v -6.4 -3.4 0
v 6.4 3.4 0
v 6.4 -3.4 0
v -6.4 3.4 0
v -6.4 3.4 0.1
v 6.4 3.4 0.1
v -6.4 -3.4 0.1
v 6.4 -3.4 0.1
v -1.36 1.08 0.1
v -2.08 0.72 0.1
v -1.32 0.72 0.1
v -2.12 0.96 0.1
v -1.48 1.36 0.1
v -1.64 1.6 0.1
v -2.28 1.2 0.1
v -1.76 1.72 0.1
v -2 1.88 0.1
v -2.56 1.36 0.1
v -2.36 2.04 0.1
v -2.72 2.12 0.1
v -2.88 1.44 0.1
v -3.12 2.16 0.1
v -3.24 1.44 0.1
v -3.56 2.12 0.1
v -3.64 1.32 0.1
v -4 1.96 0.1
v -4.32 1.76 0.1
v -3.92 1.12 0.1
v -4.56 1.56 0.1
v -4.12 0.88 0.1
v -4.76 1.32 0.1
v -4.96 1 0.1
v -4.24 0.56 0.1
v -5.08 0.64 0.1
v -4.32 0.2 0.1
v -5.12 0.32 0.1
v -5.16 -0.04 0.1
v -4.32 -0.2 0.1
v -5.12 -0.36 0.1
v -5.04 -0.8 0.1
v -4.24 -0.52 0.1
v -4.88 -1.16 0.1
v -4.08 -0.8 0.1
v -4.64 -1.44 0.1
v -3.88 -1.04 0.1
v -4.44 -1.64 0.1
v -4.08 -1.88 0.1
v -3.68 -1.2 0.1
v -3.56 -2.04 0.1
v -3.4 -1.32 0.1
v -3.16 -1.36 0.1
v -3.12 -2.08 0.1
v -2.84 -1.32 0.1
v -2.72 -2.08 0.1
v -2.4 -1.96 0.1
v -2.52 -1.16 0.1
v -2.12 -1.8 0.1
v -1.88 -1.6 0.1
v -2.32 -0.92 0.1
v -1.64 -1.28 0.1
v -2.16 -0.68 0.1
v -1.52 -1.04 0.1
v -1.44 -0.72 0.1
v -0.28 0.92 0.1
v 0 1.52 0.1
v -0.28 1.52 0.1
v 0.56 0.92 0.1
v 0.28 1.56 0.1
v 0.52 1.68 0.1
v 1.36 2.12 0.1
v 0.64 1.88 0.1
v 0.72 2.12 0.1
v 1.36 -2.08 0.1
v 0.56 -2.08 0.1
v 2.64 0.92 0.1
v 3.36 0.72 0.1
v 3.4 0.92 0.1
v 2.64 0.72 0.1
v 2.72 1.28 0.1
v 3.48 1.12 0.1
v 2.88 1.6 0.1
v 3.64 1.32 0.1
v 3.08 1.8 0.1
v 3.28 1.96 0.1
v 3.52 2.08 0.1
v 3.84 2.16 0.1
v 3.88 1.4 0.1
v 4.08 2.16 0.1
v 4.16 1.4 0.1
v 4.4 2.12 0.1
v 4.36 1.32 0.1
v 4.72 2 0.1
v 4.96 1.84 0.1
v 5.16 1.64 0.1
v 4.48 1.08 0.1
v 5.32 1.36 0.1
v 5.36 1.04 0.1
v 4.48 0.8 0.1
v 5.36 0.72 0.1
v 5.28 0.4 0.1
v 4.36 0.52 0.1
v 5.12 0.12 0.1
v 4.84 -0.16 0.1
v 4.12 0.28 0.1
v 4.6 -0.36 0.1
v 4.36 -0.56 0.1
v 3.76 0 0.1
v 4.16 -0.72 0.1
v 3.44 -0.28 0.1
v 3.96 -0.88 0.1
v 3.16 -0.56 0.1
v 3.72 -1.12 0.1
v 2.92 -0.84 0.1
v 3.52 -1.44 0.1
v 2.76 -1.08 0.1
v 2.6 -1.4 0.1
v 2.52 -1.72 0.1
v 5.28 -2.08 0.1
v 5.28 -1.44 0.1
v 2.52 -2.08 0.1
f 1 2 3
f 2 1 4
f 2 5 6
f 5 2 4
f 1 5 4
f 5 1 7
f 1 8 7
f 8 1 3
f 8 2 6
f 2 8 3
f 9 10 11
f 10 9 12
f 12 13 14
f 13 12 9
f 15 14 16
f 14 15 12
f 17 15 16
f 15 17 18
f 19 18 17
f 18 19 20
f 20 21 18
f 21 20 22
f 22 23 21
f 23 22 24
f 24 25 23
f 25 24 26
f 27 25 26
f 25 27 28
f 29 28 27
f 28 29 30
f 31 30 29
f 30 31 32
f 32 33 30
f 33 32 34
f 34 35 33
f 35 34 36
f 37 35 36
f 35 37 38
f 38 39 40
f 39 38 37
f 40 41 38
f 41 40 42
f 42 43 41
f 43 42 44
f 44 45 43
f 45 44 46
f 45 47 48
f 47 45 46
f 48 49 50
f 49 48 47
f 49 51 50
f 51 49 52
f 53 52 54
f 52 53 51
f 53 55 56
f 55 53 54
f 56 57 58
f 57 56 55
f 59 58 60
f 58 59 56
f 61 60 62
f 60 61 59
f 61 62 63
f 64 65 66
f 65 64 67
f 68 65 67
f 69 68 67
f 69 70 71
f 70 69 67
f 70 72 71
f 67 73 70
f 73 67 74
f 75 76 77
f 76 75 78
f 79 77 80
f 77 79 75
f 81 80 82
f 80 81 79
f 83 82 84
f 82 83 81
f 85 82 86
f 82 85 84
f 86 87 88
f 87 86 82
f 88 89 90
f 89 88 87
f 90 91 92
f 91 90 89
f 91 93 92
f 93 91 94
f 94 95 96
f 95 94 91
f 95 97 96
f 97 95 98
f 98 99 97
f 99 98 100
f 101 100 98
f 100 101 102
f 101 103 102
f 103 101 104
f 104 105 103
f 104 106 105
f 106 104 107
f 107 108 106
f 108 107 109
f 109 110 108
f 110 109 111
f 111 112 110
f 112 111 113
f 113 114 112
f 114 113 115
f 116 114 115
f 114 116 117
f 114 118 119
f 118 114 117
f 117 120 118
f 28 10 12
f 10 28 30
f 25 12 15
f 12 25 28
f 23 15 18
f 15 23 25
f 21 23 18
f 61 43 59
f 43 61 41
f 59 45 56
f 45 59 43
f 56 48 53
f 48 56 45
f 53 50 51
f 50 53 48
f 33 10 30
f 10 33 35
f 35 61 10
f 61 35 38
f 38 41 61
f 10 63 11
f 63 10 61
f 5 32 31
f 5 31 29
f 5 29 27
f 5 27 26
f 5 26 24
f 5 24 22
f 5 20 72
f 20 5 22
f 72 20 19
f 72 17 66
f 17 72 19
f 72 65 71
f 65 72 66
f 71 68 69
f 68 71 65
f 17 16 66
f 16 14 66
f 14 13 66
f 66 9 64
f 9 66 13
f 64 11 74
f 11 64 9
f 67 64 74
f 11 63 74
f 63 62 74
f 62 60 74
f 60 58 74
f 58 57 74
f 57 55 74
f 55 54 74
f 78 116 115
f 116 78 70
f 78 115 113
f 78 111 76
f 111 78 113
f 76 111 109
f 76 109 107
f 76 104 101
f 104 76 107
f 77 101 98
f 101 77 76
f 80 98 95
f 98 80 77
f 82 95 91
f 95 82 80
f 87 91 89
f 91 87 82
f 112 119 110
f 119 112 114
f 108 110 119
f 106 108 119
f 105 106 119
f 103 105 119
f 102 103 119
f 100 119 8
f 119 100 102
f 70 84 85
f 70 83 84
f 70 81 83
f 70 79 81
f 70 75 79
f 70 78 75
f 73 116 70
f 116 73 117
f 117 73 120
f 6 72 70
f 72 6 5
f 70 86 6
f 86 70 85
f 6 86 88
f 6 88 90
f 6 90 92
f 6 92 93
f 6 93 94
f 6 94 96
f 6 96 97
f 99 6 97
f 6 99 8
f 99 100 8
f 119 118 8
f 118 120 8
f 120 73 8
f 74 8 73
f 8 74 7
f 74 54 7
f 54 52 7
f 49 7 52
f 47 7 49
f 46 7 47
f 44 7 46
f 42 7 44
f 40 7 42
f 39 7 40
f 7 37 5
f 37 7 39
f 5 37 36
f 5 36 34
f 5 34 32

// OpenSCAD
// file: ../p/box5-12.scad
use <../lib.scad>
function ldraw_lib__box5_12() = [
// 0 Box with 5 Faces without Any Edges
// 0 Name: box5-12.dat
// 0 Author: Chris Dee [cwdee]
// 0 !LDRAW_ORG Primitive UPDATE 2009-02
// 0 !LICENSE Licensed under CC BY 2.0 and CC BY 4.0 : see CAreadme.txt
// 
// 0 BFC CERTIFY CCW
  [0,"BFC","CERTIFY"],
  [0,"BFC","CCW"],
// 
// 0 !HISTORY 2009-09-03 [PTadmin] Official Update 2009-02
// 
// 
// 4 16 1 1 1 1 1 -1 -1 1 -1 -1 1 1
  [4,16,1,1,1,1,1,-1,-1,1,-1,-1,1,1],
// 4 16 -1 0 1 1 0 1 1 1 1 -1 1 1
  [4,16,-1,0,1,1,0,1,1,1,1,-1,1,1],
// 4 16 -1 0 -1 -1 0 1 -1 1 1 -1 1 -1
  [4,16,-1,0,-1,-1,0,1,-1,1,1,-1,1,-1],
// 4 16 1 0 -1 -1 0 -1 -1 1 -1 1 1 -1
  [4,16,1,0,-1,-1,0,-1,-1,1,-1,1,1,-1],
// 4 16 1 0 1 1 0 -1 1 1 -1 1 1 1
  [4,16,1,0,1,1,0,-1,1,1,-1,1,1,1],
// 0
];
makepoly(ldraw_lib__box5_12(), line=0.2);
// main file
use <../lib.scad>
use <../p/box5-12.scad>
function ldraw_lib__820674c() = [
// 0 Sticker  0.9 x  1.6 with White "C12"
// 0 Name: 820674c.dat
// 0 Author: Alexandre Bourdais [x-or]
// 0 !LDRAW_ORG Part UPDATE 2014-02
// 0 !LICENSE Licensed under CC BY 2.0 and CC BY 4.0 : see CAreadme.txt
// 
// 0 BFC CERTIFY CCW
  [0,"BFC","CERTIFY"],
  [0,"BFC","CCW"],
// 
// 0 !KEYWORDS coastal, cutter, Set 6353
// 
// 0 !HISTORY 2014-12-23 [PTadmin] Official Update 2014-02
// 
// 
// 1 16 0 -0.25 0 16 0 0 0 0.25 0 0 0 8.5 box5-12.dat
  [1,16,0,-0.25,0,16,0,0,0,0.25,0,0,0,8.5, ldraw_lib__box5_12()],
// 4 15 -5.2 -0.25 1.8 -3.3 -0.25 1.8 -3.4 -0.25 2.7 -5.3 -0.25 2.4
  [4,15,-5.2,-0.25,1.8,-3.3,-0.25,1.8,-3.4,-0.25,2.7,-5.3,-0.25,2.4],
// 4 15 -5.3 -0.25 2.4 -3.4 -0.25 2.7 -3.7 -0.25 3.4 -4.1 -0.25 4
  [4,15,-5.3,-0.25,2.4,-3.4,-0.25,2.7,-3.7,-0.25,3.4,-4.1,-0.25,4],
// 4 15 -5.7 -0.25 3 -5.3 -0.25 2.4 -4.1 -0.25 4 -4.4 -0.25 4.3
  [4,15,-5.7,-0.25,3,-5.3,-0.25,2.4,-4.1,-0.25,4,-4.4,-0.25,4.3],
// 4 15 -5.7 -0.25 3 -4.4 -0.25 4.3 -5 -0.25 4.7 -6.4 -0.25 3.4
  [4,15,-5.7,-0.25,3,-4.4,-0.25,4.3,-5,-0.25,4.7,-6.4,-0.25,3.4],
// 4 15 -6.4 -0.25 3.4 -5 -0.25 4.7 -5.9 -0.25 5.1 -6.8 -0.25 5.3
  [4,15,-6.4,-0.25,3.4,-5,-0.25,4.7,-5.9,-0.25,5.1,-6.8,-0.25,5.3],
// 4 15 -7.2 -0.25 3.6 -6.4 -0.25 3.4 -6.8 -0.25 5.3 -7.8 -0.25 5.4
  [4,15,-7.2,-0.25,3.6,-6.4,-0.25,3.4,-6.8,-0.25,5.3,-7.8,-0.25,5.4],
// 4 15 -8.1 -0.25 3.6 -7.2 -0.25 3.6 -7.8 -0.25 5.4 -8.9 -0.25 5.3
  [4,15,-8.1,-0.25,3.6,-7.2,-0.25,3.6,-7.8,-0.25,5.4,-8.9,-0.25,5.3],
// 4 15 -9.1 -0.25 3.3 -8.1 -0.25 3.6 -8.9 -0.25 5.3 -10 -0.25 4.9
  [4,15,-9.1,-0.25,3.3,-8.1,-0.25,3.6,-8.9,-0.25,5.3,-10,-0.25,4.9],
// 4 15 -9.8 -0.25 2.8 -9.1 -0.25 3.3 -10 -0.25 4.9 -10.8 -0.25 4.4
  [4,15,-9.8,-0.25,2.8,-9.1,-0.25,3.3,-10,-0.25,4.9,-10.8,-0.25,4.4],
// 4 15 -9.8 -0.25 2.8 -10.8 -0.25 4.4 -11.4 -0.25 3.9 -10.3 -0.25 2.2
  [4,15,-9.8,-0.25,2.8,-10.8,-0.25,4.4,-11.4,-0.25,3.9,-10.3,-0.25,2.2],
// 4 15 -10.3 -0.25 2.2 -11.4 -0.25 3.9 -11.9 -0.25 3.3 -12.4 -0.25 2.5
  [4,15,-10.3,-0.25,2.2,-11.4,-0.25,3.9,-11.9,-0.25,3.3,-12.4,-0.25,2.5],
// 4 15 -10.6 -0.25 1.4 -10.3 -0.25 2.2 -12.4 -0.25 2.5 -12.7 -0.25 1.6
  [4,15,-10.6,-0.25,1.4,-10.3,-0.25,2.2,-12.4,-0.25,2.5,-12.7,-0.25,1.6],
// 4 15 -10.8 -0.25 0.5 -10.6 -0.25 1.4 -12.7 -0.25 1.6 -12.8 -0.25 0.8
  [4,15,-10.8,-0.25,0.5,-10.6,-0.25,1.4,-12.7,-0.25,1.6,-12.8,-0.25,0.8],
// 4 15 -10.8 -0.25 0.5 -12.8 -0.25 0.8 -12.9 -0.25 -0.1 -10.8 -0.25 -0.5
  [4,15,-10.8,-0.25,0.5,-12.8,-0.25,0.8,-12.9,-0.25,-0.1,-10.8,-0.25,-0.5],
// 4 15 -10.8 -0.25 -0.5 -12.9 -0.25 -0.1 -12.8 -0.25 -0.9 -12.6 -0.25 -2
  [4,15,-10.8,-0.25,-0.5,-12.9,-0.25,-0.1,-12.8,-0.25,-0.9,-12.6,-0.25,-2],
// 4 15 -10.6 -0.25 -1.3 -10.8 -0.25 -0.5 -12.6 -0.25 -2 -12.2 -0.25 -2.9
  [4,15,-10.6,-0.25,-1.3,-10.8,-0.25,-0.5,-12.6,-0.25,-2,-12.2,-0.25,-2.9],
// 4 15 -10.2 -0.25 -2 -10.6 -0.25 -1.3 -12.2 -0.25 -2.9 -11.6 -0.25 -3.6
  [4,15,-10.2,-0.25,-2,-10.6,-0.25,-1.3,-12.2,-0.25,-2.9,-11.6,-0.25,-3.6],
// 4 15 -9.7 -0.25 -2.6 -10.2 -0.25 -2 -11.6 -0.25 -3.6 -11.1 -0.25 -4.1
  [4,15,-9.7,-0.25,-2.6,-10.2,-0.25,-2,-11.6,-0.25,-3.6,-11.1,-0.25,-4.1],
// 4 15 -9.7 -0.25 -2.6 -11.1 -0.25 -4.1 -10.2 -0.25 -4.7 -9.2 -0.25 -3
  [4,15,-9.7,-0.25,-2.6,-11.1,-0.25,-4.1,-10.2,-0.25,-4.7,-9.2,-0.25,-3],
// 4 15 -9.2 -0.25 -3 -10.2 -0.25 -4.7 -8.9 -0.25 -5.1 -8.5 -0.25 -3.3
  [4,15,-9.2,-0.25,-3,-10.2,-0.25,-4.7,-8.9,-0.25,-5.1,-8.5,-0.25,-3.3],
// 4 15 -8.5 -0.25 -3.3 -8.9 -0.25 -5.1 -7.8 -0.25 -5.2 -7.9 -0.25 -3.4
  [4,15,-8.5,-0.25,-3.3,-8.9,-0.25,-5.1,-7.8,-0.25,-5.2,-7.9,-0.25,-3.4],
// 4 15 -7.9 -0.25 -3.4 -7.8 -0.25 -5.2 -6.8 -0.25 -5.2 -7.1 -0.25 -3.3
  [4,15,-7.9,-0.25,-3.4,-7.8,-0.25,-5.2,-6.8,-0.25,-5.2,-7.1,-0.25,-3.3],
// 4 15 -7.1 -0.25 -3.3 -6.8 -0.25 -5.2 -6 -0.25 -4.9 -6.3 -0.25 -2.9
  [4,15,-7.1,-0.25,-3.3,-6.8,-0.25,-5.2,-6,-0.25,-4.9,-6.3,-0.25,-2.9],
// 4 15 -6.3 -0.25 -2.9 -6 -0.25 -4.9 -5.3 -0.25 -4.5 -4.7 -0.25 -4
  [4,15,-6.3,-0.25,-2.9,-6,-0.25,-4.9,-5.3,-0.25,-4.5,-4.7,-0.25,-4],
// 4 15 -5.8 -0.25 -2.3 -6.3 -0.25 -2.9 -4.7 -0.25 -4 -4.1 -0.25 -3.2
  [4,15,-5.8,-0.25,-2.3,-6.3,-0.25,-2.9,-4.7,-0.25,-4,-4.1,-0.25,-3.2],
// 4 15 -5.8 -0.25 -2.3 -4.1 -0.25 -3.2 -3.8 -0.25 -2.6 -5.4 -0.25 -1.7
  [4,15,-5.8,-0.25,-2.3,-4.1,-0.25,-3.2,-3.8,-0.25,-2.6,-5.4,-0.25,-1.7],
// 3 15 -5.4 -0.25 -1.7 -3.8 -0.25 -2.6 -3.6 -0.25 -1.8
  [3,15,-5.4,-0.25,-1.7,-3.8,-0.25,-2.6,-3.6,-0.25,-1.8],
// 4 15 0 -0.25 3.8 -0.7 -0.25 3.8 -0.7 -0.25 2.3 1.4 -0.25 2.3
  [4,15,0,-0.25,3.8,-0.7,-0.25,3.8,-0.7,-0.25,2.3,1.4,-0.25,2.3],
// 3 15 0.7 -0.25 3.9 0 -0.25 3.8 1.4 -0.25 2.3
  [3,15,0.7,-0.25,3.9,0,-0.25,3.8,1.4,-0.25,2.3],
// 3 15 1.3 -0.25 4.2 0.7 -0.25 3.9 1.4 -0.25 2.3
  [3,15,1.3,-0.25,4.2,0.7,-0.25,3.9,1.4,-0.25,2.3],
// 4 15 1.3 -0.25 4.2 1.4 -0.25 2.3 3.4 -0.25 5.3 1.6 -0.25 4.7
  [4,15,1.3,-0.25,4.2,1.4,-0.25,2.3,3.4,-0.25,5.3,1.6,-0.25,4.7],
// 3 15 3.4 -0.25 5.3 1.8 -0.25 5.3 1.6 -0.25 4.7
  [3,15,3.4,-0.25,5.3,1.8,-0.25,5.3,1.6,-0.25,4.7],
// 4 15 3.4 -0.25 -5.2 3.4 -0.25 5.3 1.4 -0.25 2.3 1.4 -0.25 -5.2
  [4,15,3.4,-0.25,-5.2,3.4,-0.25,5.3,1.4,-0.25,2.3,1.4,-0.25,-5.2],
// 4 15 6.6 -0.25 2.3 6.6 -0.25 1.8 8.4 -0.25 1.8 8.5 -0.25 2.3
  [4,15,6.6,-0.25,2.3,6.6,-0.25,1.8,8.4,-0.25,1.8,8.5,-0.25,2.3],
// 4 15 6.8 -0.25 3.2 6.6 -0.25 2.3 8.5 -0.25 2.3 8.7 -0.25 2.8
  [4,15,6.8,-0.25,3.2,6.6,-0.25,2.3,8.5,-0.25,2.3,8.7,-0.25,2.8],
// 4 15 7.2 -0.25 4 6.8 -0.25 3.2 8.7 -0.25 2.8 9.1 -0.25 3.3
  [4,15,7.2,-0.25,4,6.8,-0.25,3.2,8.7,-0.25,2.8,9.1,-0.25,3.3],
// 4 15 7.7 -0.25 4.5 7.2 -0.25 4 9.1 -0.25 3.3 8.2 -0.25 4.9
  [4,15,7.7,-0.25,4.5,7.2,-0.25,4,9.1,-0.25,3.3,8.2,-0.25,4.9],
// 4 15 8.8 -0.25 5.2 8.2 -0.25 4.9 9.1 -0.25 3.3 9.6 -0.25 5.4
  [4,15,8.8,-0.25,5.2,8.2,-0.25,4.9,9.1,-0.25,3.3,9.6,-0.25,5.4],
// 4 15 9.6 -0.25 5.4 9.1 -0.25 3.3 9.7 -0.25 3.5 10.2 -0.25 5.4
  [4,15,9.6,-0.25,5.4,9.1,-0.25,3.3,9.7,-0.25,3.5,10.2,-0.25,5.4],
// 4 15 10.2 -0.25 5.4 9.7 -0.25 3.5 10.4 -0.25 3.5 11 -0.25 5.3
  [4,15,10.2,-0.25,5.4,9.7,-0.25,3.5,10.4,-0.25,3.5,11,-0.25,5.3],
// 4 15 11.8 -0.25 5 11 -0.25 5.3 10.4 -0.25 3.5 10.9 -0.25 3.3
  [4,15,11.8,-0.25,5,11,-0.25,5.3,10.4,-0.25,3.5,10.9,-0.25,3.3],
// 4 15 12.4 -0.25 4.6 11.8 -0.25 5 10.9 -0.25 3.3 12.9 -0.25 4.1
  [4,15,12.4,-0.25,4.6,11.8,-0.25,5,10.9,-0.25,3.3,12.9,-0.25,4.1],
// 4 15 12.9 -0.25 4.1 10.9 -0.25 3.3 11.2 -0.25 2.7 13.3 -0.25 3.4
  [4,15,12.9,-0.25,4.1,10.9,-0.25,3.3,11.2,-0.25,2.7,13.3,-0.25,3.4],
// 4 15 13.4 -0.25 2.6 13.3 -0.25 3.4 11.2 -0.25 2.7 11.2 -0.25 2
  [4,15,13.4,-0.25,2.6,13.3,-0.25,3.4,11.2,-0.25,2.7,11.2,-0.25,2],
// 4 15 13.4 -0.25 1.8 13.4 -0.25 2.6 11.2 -0.25 2 13.2 -0.25 1
  [4,15,13.4,-0.25,1.8,13.4,-0.25,2.6,11.2,-0.25,2,13.2,-0.25,1],
// 4 15 12.8 -0.25 0.3 13.2 -0.25 1 11.2 -0.25 2 10.9 -0.25 1.3
  [4,15,12.8,-0.25,0.3,13.2,-0.25,1,11.2,-0.25,2,10.9,-0.25,1.3],
// 4 15 12.1 -0.25 -0.4 12.8 -0.25 0.3 10.9 -0.25 1.3 10.3 -0.25 0.7
  [4,15,12.1,-0.25,-0.4,12.8,-0.25,0.3,10.9,-0.25,1.3,10.3,-0.25,0.7],
// 3 15 10.3 -0.25 0.7 11.5 -0.25 -0.9 12.1 -0.25 -0.4
  [3,15,10.3,-0.25,0.7,11.5,-0.25,-0.9,12.1,-0.25,-0.4],
// 4 15 10.9 -0.25 -1.4 11.5 -0.25 -0.9 10.3 -0.25 0.7 9.4 -0.25 0
  [4,15,10.9,-0.25,-1.4,11.5,-0.25,-0.9,10.3,-0.25,0.7,9.4,-0.25,0],
// 4 15 10.4 -0.25 -1.8 10.9 -0.25 -1.4 9.4 -0.25 0 8.6 -0.25 -0.7
  [4,15,10.4,-0.25,-1.8,10.9,-0.25,-1.4,9.4,-0.25,0,8.6,-0.25,-0.7],
// 4 15 9.9 -0.25 -2.2 10.4 -0.25 -1.8 8.6 -0.25 -0.7 7.9 -0.25 -1.4
  [4,15,9.9,-0.25,-2.2,10.4,-0.25,-1.8,8.6,-0.25,-0.7,7.9,-0.25,-1.4],
// 4 15 9.3 -0.25 -2.8 9.9 -0.25 -2.2 7.9 -0.25 -1.4 7.3 -0.25 -2.1
  [4,15,9.3,-0.25,-2.8,9.9,-0.25,-2.2,7.9,-0.25,-1.4,7.3,-0.25,-2.1],
// 4 15 8.8 -0.25 -3.6 9.3 -0.25 -2.8 7.3 -0.25 -2.1 6.9 -0.25 -2.7
  [4,15,8.8,-0.25,-3.6,9.3,-0.25,-2.8,7.3,-0.25,-2.1,6.9,-0.25,-2.7],
// 4 15 8.8 -0.25 -3.6 6.9 -0.25 -2.7 6.5 -0.25 -3.5 6.3 -0.25 -4.3
  [4,15,8.8,-0.25,-3.6,6.9,-0.25,-2.7,6.5,-0.25,-3.5,6.3,-0.25,-4.3],
// 4 15 13.2 -0.25 -3.6 8.8 -0.25 -3.6 6.3 -0.25 -4.3 13.2 -0.25 -5.2
  [4,15,13.2,-0.25,-3.6,8.8,-0.25,-3.6,6.3,-0.25,-4.3,13.2,-0.25,-5.2],
// 3 15 6.3 -0.25 -4.3 6.3 -0.25 -5.2 13.2 -0.25 -5.2
  [3,15,6.3,-0.25,-4.3,6.3,-0.25,-5.2,13.2,-0.25,-5.2],
// 4 16 -10.3 -0.25 2.2 -5.2 -0.25 1.8 -5.3 -0.25 2.4 -9.8 -0.25 2.8
  [4,16,-10.3,-0.25,2.2,-5.2,-0.25,1.8,-5.3,-0.25,2.4,-9.8,-0.25,2.8],
// 4 16 -9.8 -0.25 2.8 -5.3 -0.25 2.4 -5.7 -0.25 3 -9.1 -0.25 3.3
  [4,16,-9.8,-0.25,2.8,-5.3,-0.25,2.4,-5.7,-0.25,3,-9.1,-0.25,3.3],
// 4 16 -9.1 -0.25 3.3 -5.7 -0.25 3 -6.4 -0.25 3.4 -8.1 -0.25 3.6
  [4,16,-9.1,-0.25,3.3,-5.7,-0.25,3,-6.4,-0.25,3.4,-8.1,-0.25,3.6],
// 3 16 -7.2 -0.25 3.6 -8.1 -0.25 3.6 -6.4 -0.25 3.4
  [3,16,-7.2,-0.25,3.6,-8.1,-0.25,3.6,-6.4,-0.25,3.4],
// 4 16 -5.8 -0.25 -2.3 -5.4 -0.25 -1.7 -10.6 -0.25 -1.3 -10.2 -0.25 -2
  [4,16,-5.8,-0.25,-2.3,-5.4,-0.25,-1.7,-10.6,-0.25,-1.3,-10.2,-0.25,-2],
// 4 16 -6.3 -0.25 -2.9 -5.8 -0.25 -2.3 -10.2 -0.25 -2 -9.7 -0.25 -2.6
  [4,16,-6.3,-0.25,-2.9,-5.8,-0.25,-2.3,-10.2,-0.25,-2,-9.7,-0.25,-2.6],
// 4 16 -7.1 -0.25 -3.3 -6.3 -0.25 -2.9 -9.7 -0.25 -2.6 -9.2 -0.25 -3
  [4,16,-7.1,-0.25,-3.3,-6.3,-0.25,-2.9,-9.7,-0.25,-2.6,-9.2,-0.25,-3],
// 4 16 -7.9 -0.25 -3.4 -7.1 -0.25 -3.3 -9.2 -0.25 -3 -8.5 -0.25 -3.3
  [4,16,-7.9,-0.25,-3.4,-7.1,-0.25,-3.3,-9.2,-0.25,-3,-8.5,-0.25,-3.3],
// 4 16 -5.2 -0.25 1.8 -10.3 -0.25 2.2 -10.6 -0.25 1.4 -10.8 -0.25 0.5
  [4,16,-5.2,-0.25,1.8,-10.3,-0.25,2.2,-10.6,-0.25,1.4,-10.8,-0.25,0.5],
// 4 16 -5.4 -0.25 -1.7 -5.2 -0.25 1.8 -10.8 -0.25 0.5 -10.8 -0.25 -0.5
  [4,16,-5.4,-0.25,-1.7,-5.2,-0.25,1.8,-10.8,-0.25,0.5,-10.8,-0.25,-0.5],
// 3 16 -10.8 -0.25 -0.5 -10.6 -0.25 -1.3 -5.4 -0.25 -1.7
  [3,16,-10.8,-0.25,-0.5,-10.6,-0.25,-1.3,-5.4,-0.25,-1.7],
// 4 16 -3.3 -0.25 1.8 -5.2 -0.25 1.8 -5.4 -0.25 -1.7 -3.6 -0.25 -1.8
  [4,16,-3.3,-0.25,1.8,-5.2,-0.25,1.8,-5.4,-0.25,-1.7,-3.6,-0.25,-1.8],
// 3 16 -16 -0.25 8.5 -12.4 -0.25 2.5 -11.9 -0.25 3.3
  [3,16,-16,-0.25,8.5,-12.4,-0.25,2.5,-11.9,-0.25,3.3],
// 3 16 -16 -0.25 8.5 -11.9 -0.25 3.3 -11.4 -0.25 3.9
  [3,16,-16,-0.25,8.5,-11.9,-0.25,3.3,-11.4,-0.25,3.9],
// 3 16 -16 -0.25 8.5 -11.4 -0.25 3.9 -10.8 -0.25 4.4
  [3,16,-16,-0.25,8.5,-11.4,-0.25,3.9,-10.8,-0.25,4.4],
// 3 16 -16 -0.25 8.5 -10.8 -0.25 4.4 -10 -0.25 4.9
  [3,16,-16,-0.25,8.5,-10.8,-0.25,4.4,-10,-0.25,4.9],
// 3 16 -16 -0.25 8.5 -10 -0.25 4.9 -8.9 -0.25 5.3
  [3,16,-16,-0.25,8.5,-10,-0.25,4.9,-8.9,-0.25,5.3],
// 3 16 -16 -0.25 8.5 -8.9 -0.25 5.3 -7.8 -0.25 5.4
  [3,16,-16,-0.25,8.5,-8.9,-0.25,5.3,-7.8,-0.25,5.4],
// 4 16 -16 -0.25 8.5 -7.8 -0.25 5.4 -6.8 -0.25 5.3 1.8 -0.25 5.3
  [4,16,-16,-0.25,8.5,-7.8,-0.25,5.4,-6.8,-0.25,5.3,1.8,-0.25,5.3],
// 3 16 1.8 -0.25 5.3 -6.8 -0.25 5.3 -5.9 -0.25 5.1
  [3,16,1.8,-0.25,5.3,-6.8,-0.25,5.3,-5.9,-0.25,5.1],
// 4 16 1.8 -0.25 5.3 -5.9 -0.25 5.1 -5 -0.25 4.7 -0.7 -0.25 3.8
  [4,16,1.8,-0.25,5.3,-5.9,-0.25,5.1,-5,-0.25,4.7,-0.7,-0.25,3.8],
// 4 16 1.6 -0.25 4.7 1.8 -0.25 5.3 -0.7 -0.25 3.8 0 -0.25 3.8
  [4,16,1.6,-0.25,4.7,1.8,-0.25,5.3,-0.7,-0.25,3.8,0,-0.25,3.8],
// 4 16 1.3 -0.25 4.2 1.6 -0.25 4.7 0 -0.25 3.8 0.7 -0.25 3.9
  [4,16,1.3,-0.25,4.2,1.6,-0.25,4.7,0,-0.25,3.8,0.7,-0.25,3.9],
// 3 16 -5 -0.25 4.7 -4.4 -0.25 4.3 -0.7 -0.25 3.8
  [3,16,-5,-0.25,4.7,-4.4,-0.25,4.3,-0.7,-0.25,3.8],
// 3 16 -4.4 -0.25 4.3 -4.1 -0.25 4 -0.7 -0.25 3.8
  [3,16,-4.4,-0.25,4.3,-4.1,-0.25,4,-0.7,-0.25,3.8],
// 3 16 -4.1 -0.25 4 -3.7 -0.25 3.4 -0.7 -0.25 3.8
  [3,16,-4.1,-0.25,4,-3.7,-0.25,3.4,-0.7,-0.25,3.8],
// 4 16 -0.7 -0.25 3.8 -3.7 -0.25 3.4 -3.4 -0.25 2.7 -0.7 -0.25 2.3
  [4,16,-0.7,-0.25,3.8,-3.7,-0.25,3.4,-3.4,-0.25,2.7,-0.7,-0.25,2.3],
// 4 16 -0.7 -0.25 2.3 -3.4 -0.25 2.7 -3.3 -0.25 1.8 1.4 -0.25 -5.2
  [4,16,-0.7,-0.25,2.3,-3.4,-0.25,2.7,-3.3,-0.25,1.8,1.4,-0.25,-5.2],
// 3 16 1.4 -0.25 2.3 -0.7 -0.25 2.3 1.4 -0.25 -5.2
  [3,16,1.4,-0.25,2.3,-0.7,-0.25,2.3,1.4,-0.25,-5.2],
// 3 16 -3.3 -0.25 1.8 -3.6 -0.25 -1.8 1.4 -0.25 -5.2
  [3,16,-3.3,-0.25,1.8,-3.6,-0.25,-1.8,1.4,-0.25,-5.2],
// 3 16 -3.6 -0.25 -1.8 -3.8 -0.25 -2.6 1.4 -0.25 -5.2
  [3,16,-3.6,-0.25,-1.8,-3.8,-0.25,-2.6,1.4,-0.25,-5.2],
// 3 16 -3.8 -0.25 -2.6 -4.1 -0.25 -3.2 1.4 -0.25 -5.2
  [3,16,-3.8,-0.25,-2.6,-4.1,-0.25,-3.2,1.4,-0.25,-5.2],
// 3 16 -4.1 -0.25 -3.2 -4.7 -0.25 -4 1.4 -0.25 -5.2
  [3,16,-4.1,-0.25,-3.2,-4.7,-0.25,-4,1.4,-0.25,-5.2],
// 3 16 -4.7 -0.25 -4 -5.3 -0.25 -4.5 1.4 -0.25 -5.2
  [3,16,-4.7,-0.25,-4,-5.3,-0.25,-4.5,1.4,-0.25,-5.2],
// 3 16 -5.3 -0.25 -4.5 -6 -0.25 -4.9 1.4 -0.25 -5.2
  [3,16,-5.3,-0.25,-4.5,-6,-0.25,-4.9,1.4,-0.25,-5.2],
// 3 16 -6 -0.25 -4.9 -6.8 -0.25 -5.2 1.4 -0.25 -5.2
  [3,16,-6,-0.25,-4.9,-6.8,-0.25,-5.2,1.4,-0.25,-5.2],
// 4 16 6.5 -0.25 -3.5 6.9 -0.25 -2.7 6.6 -0.25 1.8 3.4 -0.25 5.3
  [4,16,6.5,-0.25,-3.5,6.9,-0.25,-2.7,6.6,-0.25,1.8,3.4,-0.25,5.3],
// 3 16 6.6 -0.25 1.8 6.9 -0.25 -2.7 7.3 -0.25 -2.1
  [3,16,6.6,-0.25,1.8,6.9,-0.25,-2.7,7.3,-0.25,-2.1],
// 4 16 6.6 -0.25 1.8 7.3 -0.25 -2.1 7.9 -0.25 -1.4 8.4 -0.25 1.8
  [4,16,6.6,-0.25,1.8,7.3,-0.25,-2.1,7.9,-0.25,-1.4,8.4,-0.25,1.8],
// 3 16 8.4 -0.25 1.8 7.9 -0.25 -1.4 8.6 -0.25 -0.7
  [3,16,8.4,-0.25,1.8,7.9,-0.25,-1.4,8.6,-0.25,-0.7],
// 3 16 8.4 -0.25 1.8 8.6 -0.25 -0.7 9.4 -0.25 0
  [3,16,8.4,-0.25,1.8,8.6,-0.25,-0.7,9.4,-0.25,0],
// 4 16 8.4 -0.25 1.8 9.4 -0.25 0 10.3 -0.25 0.7 10.9 -0.25 1.3
  [4,16,8.4,-0.25,1.8,9.4,-0.25,0,10.3,-0.25,0.7,10.9,-0.25,1.3],
// 4 16 8.4 -0.25 1.8 10.9 -0.25 1.3 11.2 -0.25 2 8.5 -0.25 2.3
  [4,16,8.4,-0.25,1.8,10.9,-0.25,1.3,11.2,-0.25,2,8.5,-0.25,2.3],
// 4 16 8.7 -0.25 2.8 8.5 -0.25 2.3 11.2 -0.25 2 11.2 -0.25 2.7
  [4,16,8.7,-0.25,2.8,8.5,-0.25,2.3,11.2,-0.25,2,11.2,-0.25,2.7],
// 4 16 8.7 -0.25 2.8 11.2 -0.25 2.7 10.9 -0.25 3.3 9.1 -0.25 3.3
  [4,16,8.7,-0.25,2.8,11.2,-0.25,2.7,10.9,-0.25,3.3,9.1,-0.25,3.3],
// 4 16 9.7 -0.25 3.5 9.1 -0.25 3.3 10.9 -0.25 3.3 10.4 -0.25 3.5
  [4,16,9.7,-0.25,3.5,9.1,-0.25,3.3,10.9,-0.25,3.3,10.4,-0.25,3.5],
// 4 16 9.3 -0.25 -2.8 8.8 -0.25 -3.6 13.2 -0.25 -3.6 9.9 -0.25 -2.2
  [4,16,9.3,-0.25,-2.8,8.8,-0.25,-3.6,13.2,-0.25,-3.6,9.9,-0.25,-2.2],
// 3 16 10.4 -0.25 -1.8 9.9 -0.25 -2.2 13.2 -0.25 -3.6
  [3,16,10.4,-0.25,-1.8,9.9,-0.25,-2.2,13.2,-0.25,-3.6],
// 3 16 10.9 -0.25 -1.4 10.4 -0.25 -1.8 13.2 -0.25 -3.6
  [3,16,10.9,-0.25,-1.4,10.4,-0.25,-1.8,13.2,-0.25,-3.6],
// 3 16 11.5 -0.25 -0.9 10.9 -0.25 -1.4 13.2 -0.25 -3.6
  [3,16,11.5,-0.25,-0.9,10.9,-0.25,-1.4,13.2,-0.25,-3.6],
// 3 16 12.1 -0.25 -0.4 11.5 -0.25 -0.9 13.2 -0.25 -3.6
  [3,16,12.1,-0.25,-0.4,11.5,-0.25,-0.9,13.2,-0.25,-3.6],
// 3 16 12.8 -0.25 0.3 12.1 -0.25 -0.4 13.2 -0.25 -3.6
  [3,16,12.8,-0.25,0.3,12.1,-0.25,-0.4,13.2,-0.25,-3.6],
// 4 16 13.2 -0.25 1 12.8 -0.25 0.3 13.2 -0.25 -3.6 16 -0.25 -8.5
  [4,16,13.2,-0.25,1,12.8,-0.25,0.3,13.2,-0.25,-3.6,16,-0.25,-8.5],
// 3 16 3.4 -0.25 5.3 8.2 -0.25 4.9 8.8 -0.25 5.2
  [3,16,3.4,-0.25,5.3,8.2,-0.25,4.9,8.8,-0.25,5.2],
// 3 16 3.4 -0.25 5.3 7.7 -0.25 4.5 8.2 -0.25 4.9
  [3,16,3.4,-0.25,5.3,7.7,-0.25,4.5,8.2,-0.25,4.9],
// 3 16 3.4 -0.25 5.3 7.2 -0.25 4 7.7 -0.25 4.5
  [3,16,3.4,-0.25,5.3,7.2,-0.25,4,7.7,-0.25,4.5],
// 3 16 3.4 -0.25 5.3 6.8 -0.25 3.2 7.2 -0.25 4
  [3,16,3.4,-0.25,5.3,6.8,-0.25,3.2,7.2,-0.25,4],
// 3 16 3.4 -0.25 5.3 6.6 -0.25 2.3 6.8 -0.25 3.2
  [3,16,3.4,-0.25,5.3,6.6,-0.25,2.3,6.8,-0.25,3.2],
// 3 16 3.4 -0.25 5.3 6.6 -0.25 1.8 6.6 -0.25 2.3
  [3,16,3.4,-0.25,5.3,6.6,-0.25,1.8,6.6,-0.25,2.3],
// 4 16 6.5 -0.25 -3.5 3.4 -0.25 5.3 3.4 -0.25 -5.2 6.3 -0.25 -4.3
  [4,16,6.5,-0.25,-3.5,3.4,-0.25,5.3,3.4,-0.25,-5.2,6.3,-0.25,-4.3],
// 3 16 6.3 -0.25 -4.3 3.4 -0.25 -5.2 6.3 -0.25 -5.2
  [3,16,6.3,-0.25,-4.3,3.4,-0.25,-5.2,6.3,-0.25,-5.2],
// 4 16 16 -0.25 8.5 -16 -0.25 8.5 1.8 -0.25 5.3 3.4 -0.25 5.3
  [4,16,16,-0.25,8.5,-16,-0.25,8.5,1.8,-0.25,5.3,3.4,-0.25,5.3],
// 4 16 16 -0.25 8.5 3.4 -0.25 5.3 8.8 -0.25 5.2 9.6 -0.25 5.4
  [4,16,16,-0.25,8.5,3.4,-0.25,5.3,8.8,-0.25,5.2,9.6,-0.25,5.4],
// 3 16 16 -0.25 8.5 9.6 -0.25 5.4 10.2 -0.25 5.4
  [3,16,16,-0.25,8.5,9.6,-0.25,5.4,10.2,-0.25,5.4],
// 3 16 16 -0.25 8.5 10.2 -0.25 5.4 11 -0.25 5.3
  [3,16,16,-0.25,8.5,10.2,-0.25,5.4,11,-0.25,5.3],
// 3 16 16 -0.25 8.5 11 -0.25 5.3 11.8 -0.25 5
  [3,16,16,-0.25,8.5,11,-0.25,5.3,11.8,-0.25,5],
// 3 16 16 -0.25 8.5 11.8 -0.25 5 12.4 -0.25 4.6
  [3,16,16,-0.25,8.5,11.8,-0.25,5,12.4,-0.25,4.6],
// 3 16 16 -0.25 8.5 12.4 -0.25 4.6 12.9 -0.25 4.1
  [3,16,16,-0.25,8.5,12.4,-0.25,4.6,12.9,-0.25,4.1],
// 3 16 16 -0.25 8.5 12.9 -0.25 4.1 13.3 -0.25 3.4
  [3,16,16,-0.25,8.5,12.9,-0.25,4.1,13.3,-0.25,3.4],
// 3 16 16 -0.25 8.5 13.3 -0.25 3.4 13.4 -0.25 2.6
  [3,16,16,-0.25,8.5,13.3,-0.25,3.4,13.4,-0.25,2.6],
// 4 16 16 -0.25 8.5 13.4 -0.25 2.6 13.4 -0.25 1.8 16 -0.25 -8.5
  [4,16,16,-0.25,8.5,13.4,-0.25,2.6,13.4,-0.25,1.8,16,-0.25,-8.5],
// 3 16 13.4 -0.25 1.8 13.2 -0.25 1 16 -0.25 -8.5
  [3,16,13.4,-0.25,1.8,13.2,-0.25,1,16,-0.25,-8.5],
// 3 16 13.2 -0.25 -3.6 13.2 -0.25 -5.2 16 -0.25 -8.5
  [3,16,13.2,-0.25,-3.6,13.2,-0.25,-5.2,16,-0.25,-8.5],
// 3 16 13.2 -0.25 -5.2 6.3 -0.25 -5.2 16 -0.25 -8.5
  [3,16,13.2,-0.25,-5.2,6.3,-0.25,-5.2,16,-0.25,-8.5],
// 3 16 6.3 -0.25 -5.2 3.4 -0.25 -5.2 16 -0.25 -8.5
  [3,16,6.3,-0.25,-5.2,3.4,-0.25,-5.2,16,-0.25,-8.5],
// 4 16 16 -0.25 -8.5 3.4 -0.25 -5.2 1.4 -0.25 -5.2 -16 -0.25 -8.5
  [4,16,16,-0.25,-8.5,3.4,-0.25,-5.2,1.4,-0.25,-5.2,-16,-0.25,-8.5],
// 3 16 1.4 -0.25 -5.2 -6.8 -0.25 -5.2 -16 -0.25 -8.5
  [3,16,1.4,-0.25,-5.2,-6.8,-0.25,-5.2,-16,-0.25,-8.5],
// 3 16 -6.8 -0.25 -5.2 -7.8 -0.25 -5.2 -16 -0.25 -8.5
  [3,16,-6.8,-0.25,-5.2,-7.8,-0.25,-5.2,-16,-0.25,-8.5],
// 3 16 -8.9 -0.25 -5.1 -16 -0.25 -8.5 -7.8 -0.25 -5.2
  [3,16,-8.9,-0.25,-5.1,-16,-0.25,-8.5,-7.8,-0.25,-5.2],
// 3 16 -10.2 -0.25 -4.7 -16 -0.25 -8.5 -8.9 -0.25 -5.1
  [3,16,-10.2,-0.25,-4.7,-16,-0.25,-8.5,-8.9,-0.25,-5.1],
// 3 16 -11.1 -0.25 -4.1 -16 -0.25 -8.5 -10.2 -0.25 -4.7
  [3,16,-11.1,-0.25,-4.1,-16,-0.25,-8.5,-10.2,-0.25,-4.7],
// 3 16 -11.6 -0.25 -3.6 -16 -0.25 -8.5 -11.1 -0.25 -4.1
  [3,16,-11.6,-0.25,-3.6,-16,-0.25,-8.5,-11.1,-0.25,-4.1],
// 3 16 -12.2 -0.25 -2.9 -16 -0.25 -8.5 -11.6 -0.25 -3.6
  [3,16,-12.2,-0.25,-2.9,-16,-0.25,-8.5,-11.6,-0.25,-3.6],
// 3 16 -12.6 -0.25 -2 -16 -0.25 -8.5 -12.2 -0.25 -2.9
  [3,16,-12.6,-0.25,-2,-16,-0.25,-8.5,-12.2,-0.25,-2.9],
// 3 16 -12.8 -0.25 -0.9 -16 -0.25 -8.5 -12.6 -0.25 -2
  [3,16,-12.8,-0.25,-0.9,-16,-0.25,-8.5,-12.6,-0.25,-2],
// 4 16 -16 -0.25 -8.5 -12.8 -0.25 -0.9 -12.9 -0.25 -0.1 -16 -0.25 8.5
  [4,16,-16,-0.25,-8.5,-12.8,-0.25,-0.9,-12.9,-0.25,-0.1,-16,-0.25,8.5],
// 3 16 -16 -0.25 8.5 -12.9 -0.25 -0.1 -12.8 -0.25 0.8
  [3,16,-16,-0.25,8.5,-12.9,-0.25,-0.1,-12.8,-0.25,0.8],
// 3 16 -16 -0.25 8.5 -12.8 -0.25 0.8 -12.7 -0.25 1.6
  [3,16,-16,-0.25,8.5,-12.8,-0.25,0.8,-12.7,-0.25,1.6],
// 3 16 -16 -0.25 8.5 -12.7 -0.25 1.6 -12.4 -0.25 2.5
  [3,16,-16,-0.25,8.5,-12.7,-0.25,1.6,-12.4,-0.25,2.5],
];
makepoly(ldraw_lib__820674c(), line=0.2);
